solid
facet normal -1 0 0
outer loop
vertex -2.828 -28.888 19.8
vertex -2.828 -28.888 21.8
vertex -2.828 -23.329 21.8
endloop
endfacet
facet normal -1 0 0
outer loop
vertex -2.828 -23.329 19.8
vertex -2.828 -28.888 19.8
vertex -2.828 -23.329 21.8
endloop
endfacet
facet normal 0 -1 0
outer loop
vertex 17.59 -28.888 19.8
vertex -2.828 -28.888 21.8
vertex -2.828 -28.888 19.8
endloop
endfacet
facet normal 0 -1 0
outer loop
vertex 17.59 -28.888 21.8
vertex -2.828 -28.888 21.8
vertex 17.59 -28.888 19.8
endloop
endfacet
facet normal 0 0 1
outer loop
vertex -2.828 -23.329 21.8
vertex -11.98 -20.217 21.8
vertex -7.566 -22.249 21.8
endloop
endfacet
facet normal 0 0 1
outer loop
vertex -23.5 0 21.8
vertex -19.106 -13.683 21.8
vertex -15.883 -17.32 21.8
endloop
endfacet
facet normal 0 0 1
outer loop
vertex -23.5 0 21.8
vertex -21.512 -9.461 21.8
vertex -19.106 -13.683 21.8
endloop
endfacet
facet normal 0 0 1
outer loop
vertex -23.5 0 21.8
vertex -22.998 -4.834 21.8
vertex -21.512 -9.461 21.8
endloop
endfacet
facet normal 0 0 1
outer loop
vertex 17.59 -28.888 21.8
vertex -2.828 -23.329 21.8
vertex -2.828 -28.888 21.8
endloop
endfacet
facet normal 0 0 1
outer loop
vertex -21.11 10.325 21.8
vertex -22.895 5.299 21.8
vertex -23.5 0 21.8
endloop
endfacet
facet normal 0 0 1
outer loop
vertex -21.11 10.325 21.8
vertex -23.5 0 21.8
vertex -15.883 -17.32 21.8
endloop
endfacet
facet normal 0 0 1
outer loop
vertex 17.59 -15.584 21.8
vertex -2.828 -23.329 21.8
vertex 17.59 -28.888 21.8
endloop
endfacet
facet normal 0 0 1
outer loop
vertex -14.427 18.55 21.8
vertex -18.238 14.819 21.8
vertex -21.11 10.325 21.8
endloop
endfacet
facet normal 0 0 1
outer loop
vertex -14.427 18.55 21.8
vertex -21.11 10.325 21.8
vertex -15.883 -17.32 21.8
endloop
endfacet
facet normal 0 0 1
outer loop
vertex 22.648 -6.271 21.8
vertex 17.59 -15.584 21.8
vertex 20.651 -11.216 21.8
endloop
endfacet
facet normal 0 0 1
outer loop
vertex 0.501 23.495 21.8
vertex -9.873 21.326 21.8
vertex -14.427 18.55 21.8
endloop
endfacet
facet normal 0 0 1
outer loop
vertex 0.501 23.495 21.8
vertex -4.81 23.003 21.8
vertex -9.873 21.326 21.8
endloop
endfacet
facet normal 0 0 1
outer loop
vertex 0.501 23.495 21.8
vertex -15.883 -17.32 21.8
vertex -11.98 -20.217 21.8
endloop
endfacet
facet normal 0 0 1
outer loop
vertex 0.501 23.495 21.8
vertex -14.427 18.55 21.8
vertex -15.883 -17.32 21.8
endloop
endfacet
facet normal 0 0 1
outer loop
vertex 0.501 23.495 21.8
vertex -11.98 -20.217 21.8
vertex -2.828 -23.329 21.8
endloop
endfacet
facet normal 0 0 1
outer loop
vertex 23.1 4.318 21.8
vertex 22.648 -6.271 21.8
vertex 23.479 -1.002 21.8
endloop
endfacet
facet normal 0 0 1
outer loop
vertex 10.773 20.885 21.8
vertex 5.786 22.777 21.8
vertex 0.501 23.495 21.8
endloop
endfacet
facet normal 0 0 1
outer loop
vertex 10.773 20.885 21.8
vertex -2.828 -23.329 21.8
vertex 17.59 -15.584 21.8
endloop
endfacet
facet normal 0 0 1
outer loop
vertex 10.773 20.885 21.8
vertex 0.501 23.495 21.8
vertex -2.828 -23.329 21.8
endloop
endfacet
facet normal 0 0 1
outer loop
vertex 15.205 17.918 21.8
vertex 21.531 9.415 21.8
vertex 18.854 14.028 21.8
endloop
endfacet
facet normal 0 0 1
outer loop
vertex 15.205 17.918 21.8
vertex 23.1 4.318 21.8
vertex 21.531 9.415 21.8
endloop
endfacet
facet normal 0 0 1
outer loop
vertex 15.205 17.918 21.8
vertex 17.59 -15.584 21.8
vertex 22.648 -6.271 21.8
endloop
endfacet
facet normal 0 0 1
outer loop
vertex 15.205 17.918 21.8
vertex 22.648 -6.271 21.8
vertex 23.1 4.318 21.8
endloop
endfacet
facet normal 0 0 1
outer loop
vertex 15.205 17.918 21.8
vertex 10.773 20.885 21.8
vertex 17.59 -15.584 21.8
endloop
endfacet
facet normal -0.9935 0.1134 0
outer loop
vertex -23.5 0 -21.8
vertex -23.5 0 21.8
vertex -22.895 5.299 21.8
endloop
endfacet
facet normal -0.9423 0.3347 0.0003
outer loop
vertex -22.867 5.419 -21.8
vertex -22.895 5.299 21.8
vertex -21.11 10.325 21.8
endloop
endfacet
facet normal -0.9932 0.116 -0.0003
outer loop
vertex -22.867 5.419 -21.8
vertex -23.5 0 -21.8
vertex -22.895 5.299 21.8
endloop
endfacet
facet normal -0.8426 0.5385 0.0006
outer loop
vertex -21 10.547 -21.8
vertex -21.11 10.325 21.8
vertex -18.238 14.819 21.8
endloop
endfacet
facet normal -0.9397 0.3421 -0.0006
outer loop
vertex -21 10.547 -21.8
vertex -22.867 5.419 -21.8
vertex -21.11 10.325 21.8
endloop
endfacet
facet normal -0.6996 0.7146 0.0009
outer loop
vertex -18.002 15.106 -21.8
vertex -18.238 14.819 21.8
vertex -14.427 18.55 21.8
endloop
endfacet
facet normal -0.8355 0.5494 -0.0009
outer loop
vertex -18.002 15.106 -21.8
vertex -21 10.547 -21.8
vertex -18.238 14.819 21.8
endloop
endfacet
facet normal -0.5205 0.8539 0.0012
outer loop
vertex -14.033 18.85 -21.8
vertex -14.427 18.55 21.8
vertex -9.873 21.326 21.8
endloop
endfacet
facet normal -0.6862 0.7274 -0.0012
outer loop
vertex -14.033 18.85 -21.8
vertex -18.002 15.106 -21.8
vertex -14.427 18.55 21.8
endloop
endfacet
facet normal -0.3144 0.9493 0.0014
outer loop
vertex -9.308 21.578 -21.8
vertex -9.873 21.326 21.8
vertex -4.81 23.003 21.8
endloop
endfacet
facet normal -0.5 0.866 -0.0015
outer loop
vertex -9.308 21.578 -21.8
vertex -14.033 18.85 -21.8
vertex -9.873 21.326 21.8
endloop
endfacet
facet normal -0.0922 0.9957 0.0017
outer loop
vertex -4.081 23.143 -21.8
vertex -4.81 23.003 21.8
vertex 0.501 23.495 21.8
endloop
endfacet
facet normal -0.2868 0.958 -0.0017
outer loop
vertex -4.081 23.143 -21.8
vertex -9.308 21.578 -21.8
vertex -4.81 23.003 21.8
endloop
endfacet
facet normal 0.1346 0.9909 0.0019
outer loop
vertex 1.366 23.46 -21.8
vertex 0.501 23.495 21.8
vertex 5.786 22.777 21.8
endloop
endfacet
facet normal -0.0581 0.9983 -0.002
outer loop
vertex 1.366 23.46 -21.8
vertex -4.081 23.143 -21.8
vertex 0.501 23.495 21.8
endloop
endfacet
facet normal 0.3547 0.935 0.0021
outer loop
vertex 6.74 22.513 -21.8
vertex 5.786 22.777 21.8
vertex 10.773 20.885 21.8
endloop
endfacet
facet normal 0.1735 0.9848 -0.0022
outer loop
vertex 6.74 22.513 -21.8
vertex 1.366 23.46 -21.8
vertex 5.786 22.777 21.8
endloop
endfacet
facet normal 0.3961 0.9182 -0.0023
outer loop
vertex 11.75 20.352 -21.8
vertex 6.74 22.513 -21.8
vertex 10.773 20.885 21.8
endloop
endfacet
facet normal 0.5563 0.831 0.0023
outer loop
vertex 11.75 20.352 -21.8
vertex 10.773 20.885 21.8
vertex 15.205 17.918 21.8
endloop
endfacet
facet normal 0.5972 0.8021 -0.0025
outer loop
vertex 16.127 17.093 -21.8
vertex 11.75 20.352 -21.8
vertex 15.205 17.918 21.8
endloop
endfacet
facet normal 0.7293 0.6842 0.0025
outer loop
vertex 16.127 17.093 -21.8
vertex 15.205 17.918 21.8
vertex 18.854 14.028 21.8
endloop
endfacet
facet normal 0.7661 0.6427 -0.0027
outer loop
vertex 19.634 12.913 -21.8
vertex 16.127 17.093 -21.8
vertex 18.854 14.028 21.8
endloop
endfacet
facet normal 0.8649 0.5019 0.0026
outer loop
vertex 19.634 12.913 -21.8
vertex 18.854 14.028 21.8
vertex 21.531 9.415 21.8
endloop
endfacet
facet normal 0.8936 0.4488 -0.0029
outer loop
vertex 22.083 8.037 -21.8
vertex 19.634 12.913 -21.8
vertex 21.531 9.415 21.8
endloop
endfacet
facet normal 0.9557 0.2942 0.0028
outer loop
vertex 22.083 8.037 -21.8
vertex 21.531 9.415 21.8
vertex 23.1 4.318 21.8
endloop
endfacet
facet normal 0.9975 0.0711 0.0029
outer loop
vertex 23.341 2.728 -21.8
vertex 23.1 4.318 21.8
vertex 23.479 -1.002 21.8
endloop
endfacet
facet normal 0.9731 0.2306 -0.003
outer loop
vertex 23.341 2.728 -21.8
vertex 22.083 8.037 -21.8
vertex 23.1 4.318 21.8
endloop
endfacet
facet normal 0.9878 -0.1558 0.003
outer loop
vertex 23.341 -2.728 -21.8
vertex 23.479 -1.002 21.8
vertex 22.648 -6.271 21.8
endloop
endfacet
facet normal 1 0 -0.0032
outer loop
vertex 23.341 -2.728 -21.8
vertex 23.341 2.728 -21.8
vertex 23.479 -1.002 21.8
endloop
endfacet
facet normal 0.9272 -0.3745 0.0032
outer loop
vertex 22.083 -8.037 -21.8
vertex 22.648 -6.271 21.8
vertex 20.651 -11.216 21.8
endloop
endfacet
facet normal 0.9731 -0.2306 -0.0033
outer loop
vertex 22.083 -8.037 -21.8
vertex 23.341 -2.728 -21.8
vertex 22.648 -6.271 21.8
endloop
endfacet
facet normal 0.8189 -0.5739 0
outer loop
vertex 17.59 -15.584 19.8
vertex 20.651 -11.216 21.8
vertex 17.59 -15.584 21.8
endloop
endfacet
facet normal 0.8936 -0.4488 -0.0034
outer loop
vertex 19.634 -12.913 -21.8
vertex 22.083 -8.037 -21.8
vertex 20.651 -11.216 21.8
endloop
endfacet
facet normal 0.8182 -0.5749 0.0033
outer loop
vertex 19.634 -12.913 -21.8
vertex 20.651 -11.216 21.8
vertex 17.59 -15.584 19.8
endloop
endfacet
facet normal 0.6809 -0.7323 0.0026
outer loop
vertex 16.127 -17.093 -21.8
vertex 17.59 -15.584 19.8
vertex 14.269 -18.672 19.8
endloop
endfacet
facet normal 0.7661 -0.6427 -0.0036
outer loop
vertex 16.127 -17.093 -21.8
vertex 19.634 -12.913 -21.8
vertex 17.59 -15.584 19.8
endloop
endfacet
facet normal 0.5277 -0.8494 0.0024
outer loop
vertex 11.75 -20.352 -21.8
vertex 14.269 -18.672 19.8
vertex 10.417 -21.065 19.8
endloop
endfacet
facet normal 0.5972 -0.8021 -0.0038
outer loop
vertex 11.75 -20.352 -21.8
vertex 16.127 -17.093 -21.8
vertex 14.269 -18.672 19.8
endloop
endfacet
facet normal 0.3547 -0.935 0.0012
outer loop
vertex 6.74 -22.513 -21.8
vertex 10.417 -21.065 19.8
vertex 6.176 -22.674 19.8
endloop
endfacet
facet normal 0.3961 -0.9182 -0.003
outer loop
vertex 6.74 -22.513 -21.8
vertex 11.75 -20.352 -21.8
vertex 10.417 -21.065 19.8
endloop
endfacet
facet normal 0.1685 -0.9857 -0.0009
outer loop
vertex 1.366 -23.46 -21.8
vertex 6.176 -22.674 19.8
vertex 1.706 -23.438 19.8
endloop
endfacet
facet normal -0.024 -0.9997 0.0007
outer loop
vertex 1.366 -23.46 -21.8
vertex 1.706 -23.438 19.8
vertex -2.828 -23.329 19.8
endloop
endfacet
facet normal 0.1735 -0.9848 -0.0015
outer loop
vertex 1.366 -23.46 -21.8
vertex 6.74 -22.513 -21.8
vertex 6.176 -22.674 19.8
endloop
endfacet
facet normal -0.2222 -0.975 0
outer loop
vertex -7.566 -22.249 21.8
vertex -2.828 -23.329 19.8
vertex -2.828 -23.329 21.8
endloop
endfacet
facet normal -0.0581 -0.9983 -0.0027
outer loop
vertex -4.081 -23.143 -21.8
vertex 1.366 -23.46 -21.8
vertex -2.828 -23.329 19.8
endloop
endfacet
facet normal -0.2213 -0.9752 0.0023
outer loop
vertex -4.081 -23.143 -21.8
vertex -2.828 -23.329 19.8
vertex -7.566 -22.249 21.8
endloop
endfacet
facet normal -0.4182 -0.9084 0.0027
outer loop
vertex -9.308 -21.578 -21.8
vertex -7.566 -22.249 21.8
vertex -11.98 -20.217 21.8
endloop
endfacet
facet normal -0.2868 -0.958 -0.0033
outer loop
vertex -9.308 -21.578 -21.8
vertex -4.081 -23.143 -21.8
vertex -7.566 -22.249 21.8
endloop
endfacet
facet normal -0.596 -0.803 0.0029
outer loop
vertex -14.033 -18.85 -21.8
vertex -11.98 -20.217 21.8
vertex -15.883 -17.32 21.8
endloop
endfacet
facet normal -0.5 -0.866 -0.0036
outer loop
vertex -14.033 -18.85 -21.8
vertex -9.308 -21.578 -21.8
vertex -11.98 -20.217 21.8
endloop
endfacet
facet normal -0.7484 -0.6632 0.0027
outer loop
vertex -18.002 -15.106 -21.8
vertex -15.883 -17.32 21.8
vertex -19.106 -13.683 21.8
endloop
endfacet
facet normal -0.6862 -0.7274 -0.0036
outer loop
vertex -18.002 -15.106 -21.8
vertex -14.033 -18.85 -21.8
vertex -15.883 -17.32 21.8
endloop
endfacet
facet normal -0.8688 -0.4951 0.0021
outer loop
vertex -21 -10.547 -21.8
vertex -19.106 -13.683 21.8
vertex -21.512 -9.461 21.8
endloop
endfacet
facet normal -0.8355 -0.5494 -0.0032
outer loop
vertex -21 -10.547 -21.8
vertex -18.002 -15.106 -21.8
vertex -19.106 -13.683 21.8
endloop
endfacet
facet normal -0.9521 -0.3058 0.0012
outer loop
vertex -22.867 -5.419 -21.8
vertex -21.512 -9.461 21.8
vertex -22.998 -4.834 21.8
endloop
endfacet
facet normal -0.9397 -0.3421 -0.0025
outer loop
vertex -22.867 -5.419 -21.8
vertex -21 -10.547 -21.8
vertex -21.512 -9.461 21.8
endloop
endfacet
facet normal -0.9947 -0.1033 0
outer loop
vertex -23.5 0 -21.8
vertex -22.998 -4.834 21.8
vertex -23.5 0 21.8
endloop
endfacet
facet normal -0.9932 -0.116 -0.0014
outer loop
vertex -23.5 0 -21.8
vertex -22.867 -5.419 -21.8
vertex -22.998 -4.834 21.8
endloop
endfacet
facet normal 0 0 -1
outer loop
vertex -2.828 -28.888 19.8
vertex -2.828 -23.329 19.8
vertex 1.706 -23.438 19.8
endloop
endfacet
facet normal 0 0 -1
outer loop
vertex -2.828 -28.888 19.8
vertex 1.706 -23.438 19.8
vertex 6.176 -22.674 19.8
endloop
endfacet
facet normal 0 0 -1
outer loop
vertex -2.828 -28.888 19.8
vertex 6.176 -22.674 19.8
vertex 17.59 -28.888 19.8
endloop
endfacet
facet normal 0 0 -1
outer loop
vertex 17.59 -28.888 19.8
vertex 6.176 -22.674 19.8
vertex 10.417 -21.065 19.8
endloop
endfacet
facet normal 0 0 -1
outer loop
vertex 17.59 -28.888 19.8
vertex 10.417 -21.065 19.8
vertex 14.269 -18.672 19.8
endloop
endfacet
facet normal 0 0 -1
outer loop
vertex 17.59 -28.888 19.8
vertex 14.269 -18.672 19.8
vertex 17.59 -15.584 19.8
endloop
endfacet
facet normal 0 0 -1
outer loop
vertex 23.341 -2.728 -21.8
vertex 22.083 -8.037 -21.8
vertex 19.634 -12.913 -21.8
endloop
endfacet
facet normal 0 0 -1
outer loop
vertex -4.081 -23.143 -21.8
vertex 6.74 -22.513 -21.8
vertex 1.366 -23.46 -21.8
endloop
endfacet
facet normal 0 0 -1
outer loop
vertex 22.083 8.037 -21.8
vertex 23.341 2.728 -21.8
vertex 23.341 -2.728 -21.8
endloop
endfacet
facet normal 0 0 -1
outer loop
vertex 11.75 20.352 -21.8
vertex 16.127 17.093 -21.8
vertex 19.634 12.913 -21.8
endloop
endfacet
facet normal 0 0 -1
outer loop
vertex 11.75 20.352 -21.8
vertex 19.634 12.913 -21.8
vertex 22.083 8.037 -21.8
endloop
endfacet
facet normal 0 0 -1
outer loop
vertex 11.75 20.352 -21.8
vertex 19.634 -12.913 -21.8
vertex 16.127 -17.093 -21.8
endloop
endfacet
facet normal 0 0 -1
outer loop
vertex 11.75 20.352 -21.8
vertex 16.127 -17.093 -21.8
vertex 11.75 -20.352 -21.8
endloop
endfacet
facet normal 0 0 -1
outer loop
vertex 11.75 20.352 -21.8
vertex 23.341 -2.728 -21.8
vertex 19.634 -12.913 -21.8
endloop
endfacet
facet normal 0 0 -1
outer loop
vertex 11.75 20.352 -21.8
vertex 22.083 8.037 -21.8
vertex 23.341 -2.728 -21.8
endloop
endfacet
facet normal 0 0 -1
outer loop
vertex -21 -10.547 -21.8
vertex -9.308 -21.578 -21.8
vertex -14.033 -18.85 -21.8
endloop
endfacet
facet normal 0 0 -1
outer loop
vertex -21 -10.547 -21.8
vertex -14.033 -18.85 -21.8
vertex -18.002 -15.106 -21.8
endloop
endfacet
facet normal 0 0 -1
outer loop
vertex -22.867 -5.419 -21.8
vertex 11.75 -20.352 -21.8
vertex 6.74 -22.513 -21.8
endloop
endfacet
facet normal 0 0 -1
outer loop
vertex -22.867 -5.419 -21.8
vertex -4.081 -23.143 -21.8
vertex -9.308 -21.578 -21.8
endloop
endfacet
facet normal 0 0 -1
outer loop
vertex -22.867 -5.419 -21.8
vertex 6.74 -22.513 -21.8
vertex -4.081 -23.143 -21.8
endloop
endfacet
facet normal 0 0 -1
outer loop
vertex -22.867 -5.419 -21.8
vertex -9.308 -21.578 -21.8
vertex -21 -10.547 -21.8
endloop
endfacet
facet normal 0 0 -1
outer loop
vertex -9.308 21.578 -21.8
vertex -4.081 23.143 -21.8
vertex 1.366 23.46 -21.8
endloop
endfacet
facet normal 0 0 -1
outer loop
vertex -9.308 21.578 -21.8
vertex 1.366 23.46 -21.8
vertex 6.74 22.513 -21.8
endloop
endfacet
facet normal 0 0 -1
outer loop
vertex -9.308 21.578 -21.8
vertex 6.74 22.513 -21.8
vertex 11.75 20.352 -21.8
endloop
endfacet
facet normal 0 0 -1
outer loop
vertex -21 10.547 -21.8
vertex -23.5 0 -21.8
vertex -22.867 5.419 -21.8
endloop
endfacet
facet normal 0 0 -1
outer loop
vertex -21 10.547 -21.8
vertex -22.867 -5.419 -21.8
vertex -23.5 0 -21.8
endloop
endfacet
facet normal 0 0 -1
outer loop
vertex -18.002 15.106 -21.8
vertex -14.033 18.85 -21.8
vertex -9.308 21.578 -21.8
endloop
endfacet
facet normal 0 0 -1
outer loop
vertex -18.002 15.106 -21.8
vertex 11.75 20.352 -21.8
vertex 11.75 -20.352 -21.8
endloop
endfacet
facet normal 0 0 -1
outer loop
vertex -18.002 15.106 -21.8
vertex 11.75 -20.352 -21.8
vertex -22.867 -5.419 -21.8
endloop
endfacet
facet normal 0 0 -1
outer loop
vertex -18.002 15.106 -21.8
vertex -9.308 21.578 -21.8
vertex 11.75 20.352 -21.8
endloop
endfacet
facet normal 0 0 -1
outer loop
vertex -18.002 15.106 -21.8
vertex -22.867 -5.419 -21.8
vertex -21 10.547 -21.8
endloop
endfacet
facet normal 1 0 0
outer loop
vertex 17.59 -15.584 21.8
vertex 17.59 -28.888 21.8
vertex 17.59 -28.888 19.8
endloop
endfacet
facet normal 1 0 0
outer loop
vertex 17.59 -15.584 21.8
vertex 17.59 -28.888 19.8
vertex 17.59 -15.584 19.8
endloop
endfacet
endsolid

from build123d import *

# Parameters (mm, degrees)
SKETCH1_R           = 23.5
BOSS_EXTRUDE1_DEPTH = 21.8
SKETCH2_W           = 20.417368514
SKETCH2_H           = 15.313025903
BOSS_EXTRUDE2_DEPTH = 2


with BuildPart() as part:
    # Sketch1 → Boss-Extrude1 (new body, symmetric)
    with BuildSketch(Plane(origin=(-36.272491561, 0, 0), x_dir=(-1, 0, 0), z_dir=(0, 0, -1))):
        with Locations((-36.272491561, 0)):
            Circle(SKETCH1_R)
    extrude(amount=BOSS_EXTRUDE1_DEPTH, both=True)

    # Sketch2 → Boss-Extrude2 (add)
    with BuildSketch(Plane.XY.offset(21.8)):
        with Locations((7.381083838, -21.231446412)):
            Rectangle(SKETCH2_W, SKETCH2_H)
    extrude(amount=-BOSS_EXTRUDE2_DEPTH)


solid = part.part
